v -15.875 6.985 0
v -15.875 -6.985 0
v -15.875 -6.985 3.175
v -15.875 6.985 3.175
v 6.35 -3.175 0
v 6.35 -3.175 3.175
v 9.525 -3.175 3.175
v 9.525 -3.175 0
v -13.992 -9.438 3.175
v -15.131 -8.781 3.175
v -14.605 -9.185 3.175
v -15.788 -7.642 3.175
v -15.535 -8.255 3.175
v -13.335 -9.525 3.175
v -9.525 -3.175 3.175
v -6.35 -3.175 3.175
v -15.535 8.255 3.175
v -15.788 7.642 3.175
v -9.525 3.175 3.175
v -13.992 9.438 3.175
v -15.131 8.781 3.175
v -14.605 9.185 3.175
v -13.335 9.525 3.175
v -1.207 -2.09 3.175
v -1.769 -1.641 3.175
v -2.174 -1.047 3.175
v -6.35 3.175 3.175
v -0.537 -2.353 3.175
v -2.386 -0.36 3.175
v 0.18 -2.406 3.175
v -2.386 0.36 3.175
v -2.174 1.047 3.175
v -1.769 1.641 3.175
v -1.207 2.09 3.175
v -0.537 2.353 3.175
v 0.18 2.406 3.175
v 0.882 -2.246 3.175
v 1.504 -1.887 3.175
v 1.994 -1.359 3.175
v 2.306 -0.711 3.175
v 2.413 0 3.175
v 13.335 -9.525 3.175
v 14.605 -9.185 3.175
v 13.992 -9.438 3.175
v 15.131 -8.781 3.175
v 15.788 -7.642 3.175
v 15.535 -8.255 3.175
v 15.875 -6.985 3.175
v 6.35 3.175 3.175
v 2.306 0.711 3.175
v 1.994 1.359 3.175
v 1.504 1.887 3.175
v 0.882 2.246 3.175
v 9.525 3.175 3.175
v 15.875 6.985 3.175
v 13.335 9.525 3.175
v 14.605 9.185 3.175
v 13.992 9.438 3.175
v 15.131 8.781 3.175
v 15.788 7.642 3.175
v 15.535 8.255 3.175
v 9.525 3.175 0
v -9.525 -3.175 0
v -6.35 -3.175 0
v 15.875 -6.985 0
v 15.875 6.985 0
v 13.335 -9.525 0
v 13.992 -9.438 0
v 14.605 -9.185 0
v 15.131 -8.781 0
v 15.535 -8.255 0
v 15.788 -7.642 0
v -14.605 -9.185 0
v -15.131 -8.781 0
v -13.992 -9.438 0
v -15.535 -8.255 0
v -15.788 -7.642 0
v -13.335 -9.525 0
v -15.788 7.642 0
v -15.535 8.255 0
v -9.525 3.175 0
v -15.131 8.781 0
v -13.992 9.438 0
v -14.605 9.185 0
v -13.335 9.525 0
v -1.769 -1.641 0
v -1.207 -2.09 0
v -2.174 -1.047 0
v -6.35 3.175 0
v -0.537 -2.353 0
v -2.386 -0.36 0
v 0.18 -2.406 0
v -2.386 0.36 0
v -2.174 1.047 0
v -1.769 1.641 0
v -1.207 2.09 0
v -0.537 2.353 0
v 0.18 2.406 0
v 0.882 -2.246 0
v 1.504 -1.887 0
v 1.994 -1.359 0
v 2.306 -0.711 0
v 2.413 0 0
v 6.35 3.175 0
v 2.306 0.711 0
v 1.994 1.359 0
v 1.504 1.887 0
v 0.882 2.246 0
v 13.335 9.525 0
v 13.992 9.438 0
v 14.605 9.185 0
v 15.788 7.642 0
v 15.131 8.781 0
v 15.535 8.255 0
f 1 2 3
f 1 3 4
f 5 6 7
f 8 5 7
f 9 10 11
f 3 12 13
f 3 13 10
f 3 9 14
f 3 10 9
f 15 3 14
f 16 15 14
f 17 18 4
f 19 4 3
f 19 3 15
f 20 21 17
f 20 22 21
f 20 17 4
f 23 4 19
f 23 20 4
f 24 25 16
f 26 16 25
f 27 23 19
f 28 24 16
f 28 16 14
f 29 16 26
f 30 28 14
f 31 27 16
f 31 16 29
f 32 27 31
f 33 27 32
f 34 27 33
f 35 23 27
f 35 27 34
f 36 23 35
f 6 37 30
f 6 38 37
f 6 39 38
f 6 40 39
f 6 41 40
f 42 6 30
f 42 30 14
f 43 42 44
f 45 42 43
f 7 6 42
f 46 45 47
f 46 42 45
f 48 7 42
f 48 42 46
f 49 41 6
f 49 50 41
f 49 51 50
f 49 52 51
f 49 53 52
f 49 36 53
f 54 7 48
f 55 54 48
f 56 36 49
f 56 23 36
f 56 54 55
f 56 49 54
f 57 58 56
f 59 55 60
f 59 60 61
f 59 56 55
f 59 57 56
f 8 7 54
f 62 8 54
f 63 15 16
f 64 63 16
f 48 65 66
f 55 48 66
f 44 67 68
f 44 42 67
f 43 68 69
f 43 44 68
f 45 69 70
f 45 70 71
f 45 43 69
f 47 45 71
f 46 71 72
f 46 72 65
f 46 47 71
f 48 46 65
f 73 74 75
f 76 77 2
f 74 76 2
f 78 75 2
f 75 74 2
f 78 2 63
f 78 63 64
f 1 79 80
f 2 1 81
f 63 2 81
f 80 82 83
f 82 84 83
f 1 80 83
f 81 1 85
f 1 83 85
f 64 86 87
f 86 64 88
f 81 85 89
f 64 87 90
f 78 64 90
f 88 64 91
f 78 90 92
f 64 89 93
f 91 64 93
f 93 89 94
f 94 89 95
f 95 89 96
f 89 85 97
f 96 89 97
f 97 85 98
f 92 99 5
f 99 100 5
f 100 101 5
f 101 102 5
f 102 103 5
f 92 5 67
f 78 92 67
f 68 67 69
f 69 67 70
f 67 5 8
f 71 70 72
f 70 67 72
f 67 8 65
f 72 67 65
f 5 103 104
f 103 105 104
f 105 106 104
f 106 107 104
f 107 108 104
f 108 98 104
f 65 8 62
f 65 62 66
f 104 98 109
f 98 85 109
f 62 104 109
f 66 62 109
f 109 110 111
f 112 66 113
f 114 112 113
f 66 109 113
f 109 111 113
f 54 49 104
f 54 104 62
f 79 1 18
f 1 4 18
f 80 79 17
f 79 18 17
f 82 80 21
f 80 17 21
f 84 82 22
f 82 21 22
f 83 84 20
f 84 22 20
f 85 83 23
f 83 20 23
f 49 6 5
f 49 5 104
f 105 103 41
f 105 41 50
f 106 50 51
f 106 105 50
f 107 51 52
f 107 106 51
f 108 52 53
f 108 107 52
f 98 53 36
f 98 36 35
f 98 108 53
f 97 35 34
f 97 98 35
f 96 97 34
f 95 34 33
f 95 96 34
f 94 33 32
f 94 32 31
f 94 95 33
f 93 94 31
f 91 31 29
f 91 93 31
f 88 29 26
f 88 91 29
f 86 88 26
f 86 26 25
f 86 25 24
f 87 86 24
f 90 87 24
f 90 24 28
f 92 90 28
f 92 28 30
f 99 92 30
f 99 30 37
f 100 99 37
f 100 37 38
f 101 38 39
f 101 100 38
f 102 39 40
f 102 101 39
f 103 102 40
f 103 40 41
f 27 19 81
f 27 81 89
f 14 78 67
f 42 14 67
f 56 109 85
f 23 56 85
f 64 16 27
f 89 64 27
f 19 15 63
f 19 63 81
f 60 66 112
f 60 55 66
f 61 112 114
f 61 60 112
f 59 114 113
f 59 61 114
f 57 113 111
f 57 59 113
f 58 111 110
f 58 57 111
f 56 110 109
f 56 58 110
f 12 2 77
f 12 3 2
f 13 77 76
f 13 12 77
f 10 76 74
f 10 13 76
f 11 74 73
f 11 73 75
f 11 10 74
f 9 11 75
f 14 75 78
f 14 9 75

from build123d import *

# Parameters (mm, degrees)
SKETCH1_W           = 6.35
SKETCH1_H           = 19.05
SKETCH1_W_2         = 19.05
SKETCH1_R           = 2.413
BOSS_EXTRUDE1_DEPTH = 3.175
FILLET1_R           = 2.54
CUT_EXTRUDE1_REACH  = 5.175
SKETCH2_W           = 3.175
SKETCH2_H           = 6.35


with BuildPart() as part:
    # Sketch1 → Boss-Extrude1 (new body)
    with BuildSketch(Plane.XY):
        with Locations((-12.7, 0)):
            Rectangle(SKETCH1_W, SKETCH1_H)
        Rectangle(SKETCH1_W_2, SKETCH1_H)
        Circle(SKETCH1_R, mode=Mode.SUBTRACT)
        with Locations((12.7, 0)):
            Rectangle(SKETCH1_W, SKETCH1_H)
    extrude(amount=BOSS_EXTRUDE1_DEPTH)

    # Fillet1
    fillet1_edges = [part.edges().sort_by_distance(p)[0] for p in [
        (-15.875, -9.525, 1.5875),
        (-15.875, 9.525, 1.5875),
        (15.875, 9.525, 1.5875),
        (15.875, -9.525, 1.5875),
    ]]
    fillet(fillet1_edges, radius=FILLET1_R)

    # Sketch2 → Cut-Extrude1 (cut, up to next)
    with BuildSketch(Plane.XY.offset(3.175), mode=Mode.PRIVATE) as cut_extrude1_sk1:
        with Locations((7.9375, 0)):
            Rectangle(SKETCH2_W, SKETCH2_H)
    cut_extrude1_tool1 = extrude(cut_extrude1_sk1.sketch, amount=-CUT_EXTRUDE1_REACH, mode=Mode.PRIVATE) & part.part
    add(cut_extrude1_tool1.solids().sort_by_distance((7.9375, 0, 3.175))[0], mode=Mode.SUBTRACT)
    # Sketch2 → Cut-Extrude1 (cut, up to next)
    with BuildSketch(Plane.XY.offset(3.175), mode=Mode.PRIVATE) as cut_extrude1_sk2:
        with Locations((-7.9375, 0)):
            Rectangle(SKETCH2_W, SKETCH2_H)
    cut_extrude1_tool2 = extrude(cut_extrude1_sk2.sketch, amount=-CUT_EXTRUDE1_REACH, mode=Mode.PRIVATE) & part.part
    add(cut_extrude1_tool2.solids().sort_by_distance((-7.9375, 0, 3.175))[0], mode=Mode.SUBTRACT)


solid = part.part
